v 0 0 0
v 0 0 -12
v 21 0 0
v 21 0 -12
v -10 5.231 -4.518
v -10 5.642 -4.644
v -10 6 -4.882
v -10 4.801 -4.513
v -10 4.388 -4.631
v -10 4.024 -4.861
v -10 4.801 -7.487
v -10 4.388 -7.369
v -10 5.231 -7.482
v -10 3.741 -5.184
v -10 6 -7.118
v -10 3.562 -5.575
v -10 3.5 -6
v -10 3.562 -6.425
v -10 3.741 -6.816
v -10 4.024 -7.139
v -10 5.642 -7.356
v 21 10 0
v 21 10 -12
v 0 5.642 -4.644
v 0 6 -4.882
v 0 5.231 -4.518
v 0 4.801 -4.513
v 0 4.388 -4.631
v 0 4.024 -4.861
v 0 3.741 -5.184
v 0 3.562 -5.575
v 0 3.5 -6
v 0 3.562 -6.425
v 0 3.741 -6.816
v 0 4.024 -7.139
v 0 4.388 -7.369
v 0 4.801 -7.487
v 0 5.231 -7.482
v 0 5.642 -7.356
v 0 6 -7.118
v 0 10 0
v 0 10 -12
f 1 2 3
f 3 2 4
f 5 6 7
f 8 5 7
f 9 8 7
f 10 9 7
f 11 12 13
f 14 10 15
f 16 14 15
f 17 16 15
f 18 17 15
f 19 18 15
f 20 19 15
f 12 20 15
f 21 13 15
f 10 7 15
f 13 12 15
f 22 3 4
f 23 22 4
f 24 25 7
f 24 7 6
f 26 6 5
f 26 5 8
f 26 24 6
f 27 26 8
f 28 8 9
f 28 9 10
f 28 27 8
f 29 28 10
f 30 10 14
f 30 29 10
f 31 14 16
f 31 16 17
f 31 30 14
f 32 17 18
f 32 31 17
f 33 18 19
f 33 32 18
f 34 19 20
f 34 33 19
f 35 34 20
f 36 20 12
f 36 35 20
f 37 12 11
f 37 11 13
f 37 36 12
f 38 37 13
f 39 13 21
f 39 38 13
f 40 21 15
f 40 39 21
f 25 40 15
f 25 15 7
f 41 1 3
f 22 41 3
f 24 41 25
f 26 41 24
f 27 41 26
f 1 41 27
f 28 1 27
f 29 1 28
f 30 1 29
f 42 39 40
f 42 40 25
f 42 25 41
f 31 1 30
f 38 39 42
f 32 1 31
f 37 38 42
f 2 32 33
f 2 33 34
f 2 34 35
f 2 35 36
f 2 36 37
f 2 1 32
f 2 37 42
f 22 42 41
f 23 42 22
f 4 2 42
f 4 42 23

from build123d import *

# Parameters (mm, degrees)
SKETCH1_W           = 21
SKETCH1_H           = 12
BOSS_EXTRUDE1_DEPTH = 10
BOSS_EXTRUDE2_DEPTH = 10


with BuildPart() as part:
    # Sketch1 → Boss-Extrude1 (new body)
    with BuildSketch(Plane(origin=(0, 0, 0), x_dir=(1, 0, 0), z_dir=(0, 1, 0))):
        with Locations((10.5, 6)):
            Rectangle(SKETCH1_W, SKETCH1_H)
    extrude(amount=BOSS_EXTRUDE1_DEPTH)

    # Sketch2 → Boss-Extrude2 (add)
    with BuildSketch(Plane.ZY):
        with BuildLine():
            Line((-7.118033989, 6), (-4.881966011, 6))
            ThreePointArc((-4.881966011, 6), (-6, 3.5), (-7.118033989, 6))
        make_face()
    extrude(amount=BOSS_EXTRUDE2_DEPTH)


solid = part.part
